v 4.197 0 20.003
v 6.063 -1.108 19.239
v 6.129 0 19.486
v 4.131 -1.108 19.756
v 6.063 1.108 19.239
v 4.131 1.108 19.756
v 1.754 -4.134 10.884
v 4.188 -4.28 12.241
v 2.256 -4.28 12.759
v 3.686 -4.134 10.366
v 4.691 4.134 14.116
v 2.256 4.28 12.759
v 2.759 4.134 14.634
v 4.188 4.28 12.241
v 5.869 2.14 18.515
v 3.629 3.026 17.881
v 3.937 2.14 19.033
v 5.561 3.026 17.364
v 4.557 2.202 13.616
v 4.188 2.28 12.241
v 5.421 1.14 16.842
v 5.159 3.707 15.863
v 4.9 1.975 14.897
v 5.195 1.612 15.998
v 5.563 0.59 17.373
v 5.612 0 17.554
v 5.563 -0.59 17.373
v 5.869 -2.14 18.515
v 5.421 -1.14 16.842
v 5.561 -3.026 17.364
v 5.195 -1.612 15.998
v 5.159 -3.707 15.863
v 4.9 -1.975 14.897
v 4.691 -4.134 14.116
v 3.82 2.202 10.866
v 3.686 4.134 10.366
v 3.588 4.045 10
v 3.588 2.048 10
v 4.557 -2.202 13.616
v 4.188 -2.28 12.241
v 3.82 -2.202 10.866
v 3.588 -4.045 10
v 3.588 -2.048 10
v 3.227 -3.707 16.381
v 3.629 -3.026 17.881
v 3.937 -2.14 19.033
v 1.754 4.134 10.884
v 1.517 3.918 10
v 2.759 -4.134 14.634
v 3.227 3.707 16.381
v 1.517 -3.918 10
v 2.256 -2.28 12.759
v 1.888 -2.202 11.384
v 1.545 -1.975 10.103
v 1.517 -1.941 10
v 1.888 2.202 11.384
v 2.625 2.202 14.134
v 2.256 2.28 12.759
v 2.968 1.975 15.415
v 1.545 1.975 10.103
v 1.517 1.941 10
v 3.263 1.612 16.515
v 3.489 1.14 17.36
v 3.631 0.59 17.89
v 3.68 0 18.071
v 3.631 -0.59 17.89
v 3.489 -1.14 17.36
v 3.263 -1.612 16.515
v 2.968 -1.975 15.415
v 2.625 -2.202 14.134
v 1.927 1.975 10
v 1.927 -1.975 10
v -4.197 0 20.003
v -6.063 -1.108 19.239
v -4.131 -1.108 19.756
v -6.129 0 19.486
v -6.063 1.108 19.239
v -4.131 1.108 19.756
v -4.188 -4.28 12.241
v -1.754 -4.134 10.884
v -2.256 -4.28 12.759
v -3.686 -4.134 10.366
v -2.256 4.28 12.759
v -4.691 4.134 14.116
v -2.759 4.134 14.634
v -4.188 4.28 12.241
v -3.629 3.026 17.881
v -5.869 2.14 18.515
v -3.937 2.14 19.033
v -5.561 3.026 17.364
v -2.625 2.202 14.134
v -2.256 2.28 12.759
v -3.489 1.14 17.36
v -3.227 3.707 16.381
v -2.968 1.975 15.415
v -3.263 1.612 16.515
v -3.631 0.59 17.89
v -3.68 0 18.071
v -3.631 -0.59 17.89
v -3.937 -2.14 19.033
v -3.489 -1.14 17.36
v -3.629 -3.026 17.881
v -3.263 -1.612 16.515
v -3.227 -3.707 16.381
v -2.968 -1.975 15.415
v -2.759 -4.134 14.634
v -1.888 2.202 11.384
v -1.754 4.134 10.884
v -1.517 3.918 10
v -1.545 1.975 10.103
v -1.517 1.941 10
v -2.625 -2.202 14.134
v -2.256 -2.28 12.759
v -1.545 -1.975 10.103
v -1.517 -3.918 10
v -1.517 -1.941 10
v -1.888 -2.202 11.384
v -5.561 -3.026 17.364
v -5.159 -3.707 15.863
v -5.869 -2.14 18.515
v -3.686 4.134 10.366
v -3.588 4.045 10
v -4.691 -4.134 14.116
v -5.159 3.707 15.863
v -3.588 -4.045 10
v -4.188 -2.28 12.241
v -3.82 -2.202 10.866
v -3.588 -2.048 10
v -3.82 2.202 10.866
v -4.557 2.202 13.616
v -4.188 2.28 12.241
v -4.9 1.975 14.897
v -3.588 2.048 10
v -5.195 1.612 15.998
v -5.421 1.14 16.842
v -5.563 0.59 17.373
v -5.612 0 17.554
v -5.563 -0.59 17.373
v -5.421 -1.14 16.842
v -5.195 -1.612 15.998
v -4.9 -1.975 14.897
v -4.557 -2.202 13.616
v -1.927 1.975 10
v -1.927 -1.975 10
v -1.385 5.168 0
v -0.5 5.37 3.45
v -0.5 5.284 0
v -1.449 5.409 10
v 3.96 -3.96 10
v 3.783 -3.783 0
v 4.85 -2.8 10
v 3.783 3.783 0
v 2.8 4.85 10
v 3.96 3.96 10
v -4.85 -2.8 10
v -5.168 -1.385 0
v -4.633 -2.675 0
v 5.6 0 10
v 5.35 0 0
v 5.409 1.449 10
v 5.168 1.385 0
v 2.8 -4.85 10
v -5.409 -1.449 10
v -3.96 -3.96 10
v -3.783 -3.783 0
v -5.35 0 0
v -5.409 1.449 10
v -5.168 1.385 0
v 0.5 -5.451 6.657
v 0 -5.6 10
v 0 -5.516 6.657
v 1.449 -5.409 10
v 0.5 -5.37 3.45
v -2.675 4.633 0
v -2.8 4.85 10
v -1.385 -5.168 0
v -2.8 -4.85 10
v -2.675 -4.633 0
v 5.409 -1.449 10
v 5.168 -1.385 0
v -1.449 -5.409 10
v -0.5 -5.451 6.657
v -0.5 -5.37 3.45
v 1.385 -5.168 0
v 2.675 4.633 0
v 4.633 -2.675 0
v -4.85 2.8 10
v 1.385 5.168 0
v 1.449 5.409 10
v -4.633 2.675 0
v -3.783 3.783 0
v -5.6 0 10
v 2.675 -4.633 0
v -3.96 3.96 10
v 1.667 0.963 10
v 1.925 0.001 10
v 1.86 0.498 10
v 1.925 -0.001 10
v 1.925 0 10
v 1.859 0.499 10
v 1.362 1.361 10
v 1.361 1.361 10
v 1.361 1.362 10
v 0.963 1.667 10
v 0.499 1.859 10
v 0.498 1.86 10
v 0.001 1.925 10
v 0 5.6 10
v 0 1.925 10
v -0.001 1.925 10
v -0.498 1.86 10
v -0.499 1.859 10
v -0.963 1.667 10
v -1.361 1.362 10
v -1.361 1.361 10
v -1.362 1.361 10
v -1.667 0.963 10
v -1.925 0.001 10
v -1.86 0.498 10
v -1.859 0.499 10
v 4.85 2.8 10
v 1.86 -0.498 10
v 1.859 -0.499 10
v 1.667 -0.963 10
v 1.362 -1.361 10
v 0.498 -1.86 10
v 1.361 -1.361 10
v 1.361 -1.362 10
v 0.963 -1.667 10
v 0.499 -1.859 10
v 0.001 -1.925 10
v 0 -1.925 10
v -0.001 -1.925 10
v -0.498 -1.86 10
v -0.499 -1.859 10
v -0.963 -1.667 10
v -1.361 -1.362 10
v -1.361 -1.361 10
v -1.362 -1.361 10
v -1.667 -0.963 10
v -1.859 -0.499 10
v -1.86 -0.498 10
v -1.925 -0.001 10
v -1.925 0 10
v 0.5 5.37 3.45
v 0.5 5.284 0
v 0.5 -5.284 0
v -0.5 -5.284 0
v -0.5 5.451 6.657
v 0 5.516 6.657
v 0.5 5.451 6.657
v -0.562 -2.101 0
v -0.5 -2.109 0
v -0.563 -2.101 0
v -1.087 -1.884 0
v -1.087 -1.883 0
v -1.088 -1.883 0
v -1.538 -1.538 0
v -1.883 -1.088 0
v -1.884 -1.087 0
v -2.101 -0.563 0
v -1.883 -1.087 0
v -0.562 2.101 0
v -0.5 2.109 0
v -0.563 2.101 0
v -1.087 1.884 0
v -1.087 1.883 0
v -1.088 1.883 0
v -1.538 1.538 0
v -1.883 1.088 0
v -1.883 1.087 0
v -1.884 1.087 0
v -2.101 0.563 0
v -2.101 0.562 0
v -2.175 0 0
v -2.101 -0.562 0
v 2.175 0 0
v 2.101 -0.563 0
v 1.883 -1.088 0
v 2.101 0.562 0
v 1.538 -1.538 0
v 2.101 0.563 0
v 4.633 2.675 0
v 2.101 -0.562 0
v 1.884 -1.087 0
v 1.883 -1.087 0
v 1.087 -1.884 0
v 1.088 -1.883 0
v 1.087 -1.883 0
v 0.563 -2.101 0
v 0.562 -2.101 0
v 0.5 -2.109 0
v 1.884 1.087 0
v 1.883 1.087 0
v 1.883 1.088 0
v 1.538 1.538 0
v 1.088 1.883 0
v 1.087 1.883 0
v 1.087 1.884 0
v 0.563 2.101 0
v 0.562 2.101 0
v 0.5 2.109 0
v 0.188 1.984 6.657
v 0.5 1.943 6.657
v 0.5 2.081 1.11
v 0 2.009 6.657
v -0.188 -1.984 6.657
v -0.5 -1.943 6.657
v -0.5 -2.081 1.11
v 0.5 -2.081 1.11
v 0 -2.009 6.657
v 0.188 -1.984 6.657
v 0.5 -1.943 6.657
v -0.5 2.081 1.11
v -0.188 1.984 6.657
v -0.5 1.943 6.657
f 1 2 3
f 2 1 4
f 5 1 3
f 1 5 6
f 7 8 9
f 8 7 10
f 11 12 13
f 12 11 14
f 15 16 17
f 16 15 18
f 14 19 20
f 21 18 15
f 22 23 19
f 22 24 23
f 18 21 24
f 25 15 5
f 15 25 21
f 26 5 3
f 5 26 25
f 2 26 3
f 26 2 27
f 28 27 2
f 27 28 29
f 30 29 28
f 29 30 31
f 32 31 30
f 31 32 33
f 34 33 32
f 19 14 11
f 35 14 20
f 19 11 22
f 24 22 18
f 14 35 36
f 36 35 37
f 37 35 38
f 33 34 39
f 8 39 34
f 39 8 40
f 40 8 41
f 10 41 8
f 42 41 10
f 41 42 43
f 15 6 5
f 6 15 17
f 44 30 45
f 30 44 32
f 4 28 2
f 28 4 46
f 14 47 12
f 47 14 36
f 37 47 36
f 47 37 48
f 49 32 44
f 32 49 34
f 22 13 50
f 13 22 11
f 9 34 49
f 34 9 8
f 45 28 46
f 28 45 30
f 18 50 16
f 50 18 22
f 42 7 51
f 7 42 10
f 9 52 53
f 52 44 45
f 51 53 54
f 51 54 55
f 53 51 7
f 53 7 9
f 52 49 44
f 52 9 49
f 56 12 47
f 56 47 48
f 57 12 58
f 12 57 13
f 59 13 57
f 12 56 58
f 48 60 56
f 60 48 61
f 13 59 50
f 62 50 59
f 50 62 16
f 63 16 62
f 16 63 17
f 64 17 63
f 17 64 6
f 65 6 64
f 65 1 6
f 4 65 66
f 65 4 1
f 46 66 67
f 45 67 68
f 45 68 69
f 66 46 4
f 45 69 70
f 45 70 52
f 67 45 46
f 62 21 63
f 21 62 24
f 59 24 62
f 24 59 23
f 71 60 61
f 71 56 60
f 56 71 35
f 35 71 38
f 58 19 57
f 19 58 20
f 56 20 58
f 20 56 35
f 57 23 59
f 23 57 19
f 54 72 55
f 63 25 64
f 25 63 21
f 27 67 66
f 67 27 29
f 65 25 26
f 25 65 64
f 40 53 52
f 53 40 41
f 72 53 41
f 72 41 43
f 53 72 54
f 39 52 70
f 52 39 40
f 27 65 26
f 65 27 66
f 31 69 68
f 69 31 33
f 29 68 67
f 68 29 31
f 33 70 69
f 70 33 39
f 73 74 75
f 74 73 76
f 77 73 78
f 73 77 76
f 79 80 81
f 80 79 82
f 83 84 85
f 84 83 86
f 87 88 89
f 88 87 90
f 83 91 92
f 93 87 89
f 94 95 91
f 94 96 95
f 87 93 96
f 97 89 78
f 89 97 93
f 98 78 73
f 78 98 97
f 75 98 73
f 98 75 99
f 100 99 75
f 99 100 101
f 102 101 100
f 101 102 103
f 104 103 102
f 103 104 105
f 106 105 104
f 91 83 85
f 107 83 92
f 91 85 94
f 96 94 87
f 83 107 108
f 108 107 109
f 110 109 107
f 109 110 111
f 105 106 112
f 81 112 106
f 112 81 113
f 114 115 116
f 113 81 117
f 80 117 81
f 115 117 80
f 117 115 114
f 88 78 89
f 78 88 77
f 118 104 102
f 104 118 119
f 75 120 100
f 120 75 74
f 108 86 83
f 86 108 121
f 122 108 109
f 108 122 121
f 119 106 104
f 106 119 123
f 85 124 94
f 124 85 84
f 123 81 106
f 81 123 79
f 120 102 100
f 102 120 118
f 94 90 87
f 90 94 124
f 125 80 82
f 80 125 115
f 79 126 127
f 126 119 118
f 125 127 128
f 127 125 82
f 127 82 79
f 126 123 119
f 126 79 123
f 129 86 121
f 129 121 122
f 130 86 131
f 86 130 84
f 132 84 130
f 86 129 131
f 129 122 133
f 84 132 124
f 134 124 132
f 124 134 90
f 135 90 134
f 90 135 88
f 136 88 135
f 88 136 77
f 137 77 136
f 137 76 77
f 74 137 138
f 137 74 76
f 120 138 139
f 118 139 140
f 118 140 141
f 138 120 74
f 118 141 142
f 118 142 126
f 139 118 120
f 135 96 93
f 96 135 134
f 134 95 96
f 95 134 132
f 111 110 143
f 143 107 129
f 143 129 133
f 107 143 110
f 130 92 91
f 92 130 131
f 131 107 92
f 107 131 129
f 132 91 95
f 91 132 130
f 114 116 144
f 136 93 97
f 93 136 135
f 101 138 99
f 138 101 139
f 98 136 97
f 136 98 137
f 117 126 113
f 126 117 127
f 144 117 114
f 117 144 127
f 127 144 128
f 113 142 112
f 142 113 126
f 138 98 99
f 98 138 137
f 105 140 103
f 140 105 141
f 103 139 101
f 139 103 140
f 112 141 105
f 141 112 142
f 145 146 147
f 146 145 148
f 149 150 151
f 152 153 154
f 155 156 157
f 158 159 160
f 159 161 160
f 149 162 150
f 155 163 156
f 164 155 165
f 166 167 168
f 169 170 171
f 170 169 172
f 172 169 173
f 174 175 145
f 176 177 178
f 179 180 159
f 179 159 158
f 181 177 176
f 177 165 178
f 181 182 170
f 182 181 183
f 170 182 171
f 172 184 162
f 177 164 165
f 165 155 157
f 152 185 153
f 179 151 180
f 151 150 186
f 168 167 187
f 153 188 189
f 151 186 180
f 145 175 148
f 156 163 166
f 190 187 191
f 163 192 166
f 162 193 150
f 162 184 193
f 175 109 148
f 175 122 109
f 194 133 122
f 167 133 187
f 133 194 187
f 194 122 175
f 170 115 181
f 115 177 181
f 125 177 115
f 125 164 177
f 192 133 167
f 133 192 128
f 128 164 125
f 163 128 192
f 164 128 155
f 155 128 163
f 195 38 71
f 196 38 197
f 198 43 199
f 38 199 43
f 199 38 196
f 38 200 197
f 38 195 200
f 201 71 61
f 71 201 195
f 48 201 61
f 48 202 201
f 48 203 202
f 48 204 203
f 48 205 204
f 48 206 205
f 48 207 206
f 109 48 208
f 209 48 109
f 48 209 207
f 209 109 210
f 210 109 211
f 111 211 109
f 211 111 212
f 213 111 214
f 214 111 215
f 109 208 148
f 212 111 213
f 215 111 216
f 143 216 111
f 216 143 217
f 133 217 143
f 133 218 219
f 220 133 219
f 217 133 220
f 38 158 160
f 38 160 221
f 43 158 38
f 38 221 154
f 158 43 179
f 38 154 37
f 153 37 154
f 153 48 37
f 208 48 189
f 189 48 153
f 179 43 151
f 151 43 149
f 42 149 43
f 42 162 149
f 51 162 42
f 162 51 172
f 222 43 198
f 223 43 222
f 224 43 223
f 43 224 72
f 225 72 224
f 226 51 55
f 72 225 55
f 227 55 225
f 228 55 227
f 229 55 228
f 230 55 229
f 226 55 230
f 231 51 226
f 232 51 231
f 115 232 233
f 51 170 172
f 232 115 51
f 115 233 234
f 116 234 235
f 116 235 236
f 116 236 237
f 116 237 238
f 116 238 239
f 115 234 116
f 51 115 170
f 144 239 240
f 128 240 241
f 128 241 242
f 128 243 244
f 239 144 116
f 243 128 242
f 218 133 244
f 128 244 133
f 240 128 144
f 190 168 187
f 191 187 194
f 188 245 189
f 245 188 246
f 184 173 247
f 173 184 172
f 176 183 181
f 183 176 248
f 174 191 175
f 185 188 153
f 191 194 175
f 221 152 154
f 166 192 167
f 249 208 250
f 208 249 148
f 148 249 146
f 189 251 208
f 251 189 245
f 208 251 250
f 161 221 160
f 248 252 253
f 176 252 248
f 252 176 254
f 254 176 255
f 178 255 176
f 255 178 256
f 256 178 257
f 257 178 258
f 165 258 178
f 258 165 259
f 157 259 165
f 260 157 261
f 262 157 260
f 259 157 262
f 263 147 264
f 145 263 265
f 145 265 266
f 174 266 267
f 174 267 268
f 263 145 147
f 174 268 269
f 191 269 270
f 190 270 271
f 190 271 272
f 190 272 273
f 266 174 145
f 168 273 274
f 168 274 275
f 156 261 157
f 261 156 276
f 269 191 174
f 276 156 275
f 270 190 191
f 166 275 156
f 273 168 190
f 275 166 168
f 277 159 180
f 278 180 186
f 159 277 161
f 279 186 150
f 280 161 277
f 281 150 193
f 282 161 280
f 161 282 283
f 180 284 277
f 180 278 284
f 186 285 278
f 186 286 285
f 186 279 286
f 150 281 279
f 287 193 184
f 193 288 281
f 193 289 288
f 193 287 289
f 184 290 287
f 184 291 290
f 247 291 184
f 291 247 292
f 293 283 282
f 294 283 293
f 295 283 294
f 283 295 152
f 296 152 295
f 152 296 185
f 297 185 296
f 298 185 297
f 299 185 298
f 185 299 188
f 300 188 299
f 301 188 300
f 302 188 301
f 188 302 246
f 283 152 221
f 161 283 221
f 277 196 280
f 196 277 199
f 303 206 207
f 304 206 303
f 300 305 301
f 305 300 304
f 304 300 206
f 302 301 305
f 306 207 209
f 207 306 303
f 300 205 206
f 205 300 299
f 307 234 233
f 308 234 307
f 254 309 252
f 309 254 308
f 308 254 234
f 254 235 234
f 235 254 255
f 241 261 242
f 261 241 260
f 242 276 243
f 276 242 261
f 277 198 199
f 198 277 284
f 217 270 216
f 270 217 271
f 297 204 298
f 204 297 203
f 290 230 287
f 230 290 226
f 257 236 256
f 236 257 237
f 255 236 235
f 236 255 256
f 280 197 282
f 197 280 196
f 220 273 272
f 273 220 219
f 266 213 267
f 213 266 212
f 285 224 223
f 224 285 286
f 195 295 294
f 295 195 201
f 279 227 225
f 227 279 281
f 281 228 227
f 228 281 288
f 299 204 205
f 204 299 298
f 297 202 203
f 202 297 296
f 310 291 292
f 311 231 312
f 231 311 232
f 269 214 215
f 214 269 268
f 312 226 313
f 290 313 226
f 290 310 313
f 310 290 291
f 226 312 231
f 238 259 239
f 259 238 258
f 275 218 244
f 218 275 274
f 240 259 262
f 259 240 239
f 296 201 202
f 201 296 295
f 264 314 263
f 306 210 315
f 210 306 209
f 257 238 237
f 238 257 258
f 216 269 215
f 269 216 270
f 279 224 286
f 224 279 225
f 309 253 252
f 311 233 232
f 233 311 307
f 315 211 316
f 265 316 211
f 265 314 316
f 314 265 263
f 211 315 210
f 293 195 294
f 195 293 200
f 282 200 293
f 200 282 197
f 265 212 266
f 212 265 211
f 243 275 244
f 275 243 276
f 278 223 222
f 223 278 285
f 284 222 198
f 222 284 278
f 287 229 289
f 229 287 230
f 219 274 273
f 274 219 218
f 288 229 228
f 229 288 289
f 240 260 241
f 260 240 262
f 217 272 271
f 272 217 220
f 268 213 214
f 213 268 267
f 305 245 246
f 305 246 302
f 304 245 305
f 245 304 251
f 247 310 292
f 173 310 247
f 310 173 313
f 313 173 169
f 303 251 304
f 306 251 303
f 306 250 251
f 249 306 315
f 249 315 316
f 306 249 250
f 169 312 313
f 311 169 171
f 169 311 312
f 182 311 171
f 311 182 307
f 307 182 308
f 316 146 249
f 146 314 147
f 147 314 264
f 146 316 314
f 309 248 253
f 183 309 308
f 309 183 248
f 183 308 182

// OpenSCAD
plug_diameter=10.70;
plug_height=10;
plug_taper=0.5;
fork_length=15;
fork_thickness=2.0;
fork_angle=15;

hole_diameter=4.35;
hole_taper=0.5;
slot=1;

$fn=24;

difference() {
  union() {
    cylinder(d1=plug_diameter,d2=plug_diameter+plug_taper,h=plug_height);

    translate([(plug_diameter-fork_thickness)/2.7,0,1.25*plug_height]) {
      rotate([0,90+fork_angle,0]) {
        difference() {
          resize([fork_length,plug_diameter/1.25,fork_thickness]) {
            cylinder(d=fork_length,h=fork_thickness,center=true);
          }
          resize([fork_length-2*fork_thickness,plug_diameter/1.25-2*fork_thickness,fork_thickness+0.01]) {
            cylinder(d=fork_length,h=fork_thickness,center=true);
          }
        }
      }
    }

    translate([-(plug_diameter-fork_thickness)/2.7,0,1.25*plug_height]) {
      rotate([0,90-fork_angle,0]) {
        difference() {
          resize([fork_length,plug_diameter/1.25,fork_thickness]) {
            cylinder(d=fork_length,h=fork_thickness,center=true);
          }
          resize([fork_length-2*fork_thickness,plug_diameter/1.25-2*fork_thickness,fork_thickness+0.01]) {
            cylinder(d=fork_length,h=fork_thickness,center=true);
          }
        }
      }
    }
  }
  translate([0,0,-0.01]) {
    cylinder(d1=hole_diameter,d2=hole_diameter-hole_taper,h=plug_height+0.02);
    translate([0,0,plug_height/3]) {
      cube([slot, plug_diameter+plug_taper, plug_height/1.5], center=true);
    }
  }
}
